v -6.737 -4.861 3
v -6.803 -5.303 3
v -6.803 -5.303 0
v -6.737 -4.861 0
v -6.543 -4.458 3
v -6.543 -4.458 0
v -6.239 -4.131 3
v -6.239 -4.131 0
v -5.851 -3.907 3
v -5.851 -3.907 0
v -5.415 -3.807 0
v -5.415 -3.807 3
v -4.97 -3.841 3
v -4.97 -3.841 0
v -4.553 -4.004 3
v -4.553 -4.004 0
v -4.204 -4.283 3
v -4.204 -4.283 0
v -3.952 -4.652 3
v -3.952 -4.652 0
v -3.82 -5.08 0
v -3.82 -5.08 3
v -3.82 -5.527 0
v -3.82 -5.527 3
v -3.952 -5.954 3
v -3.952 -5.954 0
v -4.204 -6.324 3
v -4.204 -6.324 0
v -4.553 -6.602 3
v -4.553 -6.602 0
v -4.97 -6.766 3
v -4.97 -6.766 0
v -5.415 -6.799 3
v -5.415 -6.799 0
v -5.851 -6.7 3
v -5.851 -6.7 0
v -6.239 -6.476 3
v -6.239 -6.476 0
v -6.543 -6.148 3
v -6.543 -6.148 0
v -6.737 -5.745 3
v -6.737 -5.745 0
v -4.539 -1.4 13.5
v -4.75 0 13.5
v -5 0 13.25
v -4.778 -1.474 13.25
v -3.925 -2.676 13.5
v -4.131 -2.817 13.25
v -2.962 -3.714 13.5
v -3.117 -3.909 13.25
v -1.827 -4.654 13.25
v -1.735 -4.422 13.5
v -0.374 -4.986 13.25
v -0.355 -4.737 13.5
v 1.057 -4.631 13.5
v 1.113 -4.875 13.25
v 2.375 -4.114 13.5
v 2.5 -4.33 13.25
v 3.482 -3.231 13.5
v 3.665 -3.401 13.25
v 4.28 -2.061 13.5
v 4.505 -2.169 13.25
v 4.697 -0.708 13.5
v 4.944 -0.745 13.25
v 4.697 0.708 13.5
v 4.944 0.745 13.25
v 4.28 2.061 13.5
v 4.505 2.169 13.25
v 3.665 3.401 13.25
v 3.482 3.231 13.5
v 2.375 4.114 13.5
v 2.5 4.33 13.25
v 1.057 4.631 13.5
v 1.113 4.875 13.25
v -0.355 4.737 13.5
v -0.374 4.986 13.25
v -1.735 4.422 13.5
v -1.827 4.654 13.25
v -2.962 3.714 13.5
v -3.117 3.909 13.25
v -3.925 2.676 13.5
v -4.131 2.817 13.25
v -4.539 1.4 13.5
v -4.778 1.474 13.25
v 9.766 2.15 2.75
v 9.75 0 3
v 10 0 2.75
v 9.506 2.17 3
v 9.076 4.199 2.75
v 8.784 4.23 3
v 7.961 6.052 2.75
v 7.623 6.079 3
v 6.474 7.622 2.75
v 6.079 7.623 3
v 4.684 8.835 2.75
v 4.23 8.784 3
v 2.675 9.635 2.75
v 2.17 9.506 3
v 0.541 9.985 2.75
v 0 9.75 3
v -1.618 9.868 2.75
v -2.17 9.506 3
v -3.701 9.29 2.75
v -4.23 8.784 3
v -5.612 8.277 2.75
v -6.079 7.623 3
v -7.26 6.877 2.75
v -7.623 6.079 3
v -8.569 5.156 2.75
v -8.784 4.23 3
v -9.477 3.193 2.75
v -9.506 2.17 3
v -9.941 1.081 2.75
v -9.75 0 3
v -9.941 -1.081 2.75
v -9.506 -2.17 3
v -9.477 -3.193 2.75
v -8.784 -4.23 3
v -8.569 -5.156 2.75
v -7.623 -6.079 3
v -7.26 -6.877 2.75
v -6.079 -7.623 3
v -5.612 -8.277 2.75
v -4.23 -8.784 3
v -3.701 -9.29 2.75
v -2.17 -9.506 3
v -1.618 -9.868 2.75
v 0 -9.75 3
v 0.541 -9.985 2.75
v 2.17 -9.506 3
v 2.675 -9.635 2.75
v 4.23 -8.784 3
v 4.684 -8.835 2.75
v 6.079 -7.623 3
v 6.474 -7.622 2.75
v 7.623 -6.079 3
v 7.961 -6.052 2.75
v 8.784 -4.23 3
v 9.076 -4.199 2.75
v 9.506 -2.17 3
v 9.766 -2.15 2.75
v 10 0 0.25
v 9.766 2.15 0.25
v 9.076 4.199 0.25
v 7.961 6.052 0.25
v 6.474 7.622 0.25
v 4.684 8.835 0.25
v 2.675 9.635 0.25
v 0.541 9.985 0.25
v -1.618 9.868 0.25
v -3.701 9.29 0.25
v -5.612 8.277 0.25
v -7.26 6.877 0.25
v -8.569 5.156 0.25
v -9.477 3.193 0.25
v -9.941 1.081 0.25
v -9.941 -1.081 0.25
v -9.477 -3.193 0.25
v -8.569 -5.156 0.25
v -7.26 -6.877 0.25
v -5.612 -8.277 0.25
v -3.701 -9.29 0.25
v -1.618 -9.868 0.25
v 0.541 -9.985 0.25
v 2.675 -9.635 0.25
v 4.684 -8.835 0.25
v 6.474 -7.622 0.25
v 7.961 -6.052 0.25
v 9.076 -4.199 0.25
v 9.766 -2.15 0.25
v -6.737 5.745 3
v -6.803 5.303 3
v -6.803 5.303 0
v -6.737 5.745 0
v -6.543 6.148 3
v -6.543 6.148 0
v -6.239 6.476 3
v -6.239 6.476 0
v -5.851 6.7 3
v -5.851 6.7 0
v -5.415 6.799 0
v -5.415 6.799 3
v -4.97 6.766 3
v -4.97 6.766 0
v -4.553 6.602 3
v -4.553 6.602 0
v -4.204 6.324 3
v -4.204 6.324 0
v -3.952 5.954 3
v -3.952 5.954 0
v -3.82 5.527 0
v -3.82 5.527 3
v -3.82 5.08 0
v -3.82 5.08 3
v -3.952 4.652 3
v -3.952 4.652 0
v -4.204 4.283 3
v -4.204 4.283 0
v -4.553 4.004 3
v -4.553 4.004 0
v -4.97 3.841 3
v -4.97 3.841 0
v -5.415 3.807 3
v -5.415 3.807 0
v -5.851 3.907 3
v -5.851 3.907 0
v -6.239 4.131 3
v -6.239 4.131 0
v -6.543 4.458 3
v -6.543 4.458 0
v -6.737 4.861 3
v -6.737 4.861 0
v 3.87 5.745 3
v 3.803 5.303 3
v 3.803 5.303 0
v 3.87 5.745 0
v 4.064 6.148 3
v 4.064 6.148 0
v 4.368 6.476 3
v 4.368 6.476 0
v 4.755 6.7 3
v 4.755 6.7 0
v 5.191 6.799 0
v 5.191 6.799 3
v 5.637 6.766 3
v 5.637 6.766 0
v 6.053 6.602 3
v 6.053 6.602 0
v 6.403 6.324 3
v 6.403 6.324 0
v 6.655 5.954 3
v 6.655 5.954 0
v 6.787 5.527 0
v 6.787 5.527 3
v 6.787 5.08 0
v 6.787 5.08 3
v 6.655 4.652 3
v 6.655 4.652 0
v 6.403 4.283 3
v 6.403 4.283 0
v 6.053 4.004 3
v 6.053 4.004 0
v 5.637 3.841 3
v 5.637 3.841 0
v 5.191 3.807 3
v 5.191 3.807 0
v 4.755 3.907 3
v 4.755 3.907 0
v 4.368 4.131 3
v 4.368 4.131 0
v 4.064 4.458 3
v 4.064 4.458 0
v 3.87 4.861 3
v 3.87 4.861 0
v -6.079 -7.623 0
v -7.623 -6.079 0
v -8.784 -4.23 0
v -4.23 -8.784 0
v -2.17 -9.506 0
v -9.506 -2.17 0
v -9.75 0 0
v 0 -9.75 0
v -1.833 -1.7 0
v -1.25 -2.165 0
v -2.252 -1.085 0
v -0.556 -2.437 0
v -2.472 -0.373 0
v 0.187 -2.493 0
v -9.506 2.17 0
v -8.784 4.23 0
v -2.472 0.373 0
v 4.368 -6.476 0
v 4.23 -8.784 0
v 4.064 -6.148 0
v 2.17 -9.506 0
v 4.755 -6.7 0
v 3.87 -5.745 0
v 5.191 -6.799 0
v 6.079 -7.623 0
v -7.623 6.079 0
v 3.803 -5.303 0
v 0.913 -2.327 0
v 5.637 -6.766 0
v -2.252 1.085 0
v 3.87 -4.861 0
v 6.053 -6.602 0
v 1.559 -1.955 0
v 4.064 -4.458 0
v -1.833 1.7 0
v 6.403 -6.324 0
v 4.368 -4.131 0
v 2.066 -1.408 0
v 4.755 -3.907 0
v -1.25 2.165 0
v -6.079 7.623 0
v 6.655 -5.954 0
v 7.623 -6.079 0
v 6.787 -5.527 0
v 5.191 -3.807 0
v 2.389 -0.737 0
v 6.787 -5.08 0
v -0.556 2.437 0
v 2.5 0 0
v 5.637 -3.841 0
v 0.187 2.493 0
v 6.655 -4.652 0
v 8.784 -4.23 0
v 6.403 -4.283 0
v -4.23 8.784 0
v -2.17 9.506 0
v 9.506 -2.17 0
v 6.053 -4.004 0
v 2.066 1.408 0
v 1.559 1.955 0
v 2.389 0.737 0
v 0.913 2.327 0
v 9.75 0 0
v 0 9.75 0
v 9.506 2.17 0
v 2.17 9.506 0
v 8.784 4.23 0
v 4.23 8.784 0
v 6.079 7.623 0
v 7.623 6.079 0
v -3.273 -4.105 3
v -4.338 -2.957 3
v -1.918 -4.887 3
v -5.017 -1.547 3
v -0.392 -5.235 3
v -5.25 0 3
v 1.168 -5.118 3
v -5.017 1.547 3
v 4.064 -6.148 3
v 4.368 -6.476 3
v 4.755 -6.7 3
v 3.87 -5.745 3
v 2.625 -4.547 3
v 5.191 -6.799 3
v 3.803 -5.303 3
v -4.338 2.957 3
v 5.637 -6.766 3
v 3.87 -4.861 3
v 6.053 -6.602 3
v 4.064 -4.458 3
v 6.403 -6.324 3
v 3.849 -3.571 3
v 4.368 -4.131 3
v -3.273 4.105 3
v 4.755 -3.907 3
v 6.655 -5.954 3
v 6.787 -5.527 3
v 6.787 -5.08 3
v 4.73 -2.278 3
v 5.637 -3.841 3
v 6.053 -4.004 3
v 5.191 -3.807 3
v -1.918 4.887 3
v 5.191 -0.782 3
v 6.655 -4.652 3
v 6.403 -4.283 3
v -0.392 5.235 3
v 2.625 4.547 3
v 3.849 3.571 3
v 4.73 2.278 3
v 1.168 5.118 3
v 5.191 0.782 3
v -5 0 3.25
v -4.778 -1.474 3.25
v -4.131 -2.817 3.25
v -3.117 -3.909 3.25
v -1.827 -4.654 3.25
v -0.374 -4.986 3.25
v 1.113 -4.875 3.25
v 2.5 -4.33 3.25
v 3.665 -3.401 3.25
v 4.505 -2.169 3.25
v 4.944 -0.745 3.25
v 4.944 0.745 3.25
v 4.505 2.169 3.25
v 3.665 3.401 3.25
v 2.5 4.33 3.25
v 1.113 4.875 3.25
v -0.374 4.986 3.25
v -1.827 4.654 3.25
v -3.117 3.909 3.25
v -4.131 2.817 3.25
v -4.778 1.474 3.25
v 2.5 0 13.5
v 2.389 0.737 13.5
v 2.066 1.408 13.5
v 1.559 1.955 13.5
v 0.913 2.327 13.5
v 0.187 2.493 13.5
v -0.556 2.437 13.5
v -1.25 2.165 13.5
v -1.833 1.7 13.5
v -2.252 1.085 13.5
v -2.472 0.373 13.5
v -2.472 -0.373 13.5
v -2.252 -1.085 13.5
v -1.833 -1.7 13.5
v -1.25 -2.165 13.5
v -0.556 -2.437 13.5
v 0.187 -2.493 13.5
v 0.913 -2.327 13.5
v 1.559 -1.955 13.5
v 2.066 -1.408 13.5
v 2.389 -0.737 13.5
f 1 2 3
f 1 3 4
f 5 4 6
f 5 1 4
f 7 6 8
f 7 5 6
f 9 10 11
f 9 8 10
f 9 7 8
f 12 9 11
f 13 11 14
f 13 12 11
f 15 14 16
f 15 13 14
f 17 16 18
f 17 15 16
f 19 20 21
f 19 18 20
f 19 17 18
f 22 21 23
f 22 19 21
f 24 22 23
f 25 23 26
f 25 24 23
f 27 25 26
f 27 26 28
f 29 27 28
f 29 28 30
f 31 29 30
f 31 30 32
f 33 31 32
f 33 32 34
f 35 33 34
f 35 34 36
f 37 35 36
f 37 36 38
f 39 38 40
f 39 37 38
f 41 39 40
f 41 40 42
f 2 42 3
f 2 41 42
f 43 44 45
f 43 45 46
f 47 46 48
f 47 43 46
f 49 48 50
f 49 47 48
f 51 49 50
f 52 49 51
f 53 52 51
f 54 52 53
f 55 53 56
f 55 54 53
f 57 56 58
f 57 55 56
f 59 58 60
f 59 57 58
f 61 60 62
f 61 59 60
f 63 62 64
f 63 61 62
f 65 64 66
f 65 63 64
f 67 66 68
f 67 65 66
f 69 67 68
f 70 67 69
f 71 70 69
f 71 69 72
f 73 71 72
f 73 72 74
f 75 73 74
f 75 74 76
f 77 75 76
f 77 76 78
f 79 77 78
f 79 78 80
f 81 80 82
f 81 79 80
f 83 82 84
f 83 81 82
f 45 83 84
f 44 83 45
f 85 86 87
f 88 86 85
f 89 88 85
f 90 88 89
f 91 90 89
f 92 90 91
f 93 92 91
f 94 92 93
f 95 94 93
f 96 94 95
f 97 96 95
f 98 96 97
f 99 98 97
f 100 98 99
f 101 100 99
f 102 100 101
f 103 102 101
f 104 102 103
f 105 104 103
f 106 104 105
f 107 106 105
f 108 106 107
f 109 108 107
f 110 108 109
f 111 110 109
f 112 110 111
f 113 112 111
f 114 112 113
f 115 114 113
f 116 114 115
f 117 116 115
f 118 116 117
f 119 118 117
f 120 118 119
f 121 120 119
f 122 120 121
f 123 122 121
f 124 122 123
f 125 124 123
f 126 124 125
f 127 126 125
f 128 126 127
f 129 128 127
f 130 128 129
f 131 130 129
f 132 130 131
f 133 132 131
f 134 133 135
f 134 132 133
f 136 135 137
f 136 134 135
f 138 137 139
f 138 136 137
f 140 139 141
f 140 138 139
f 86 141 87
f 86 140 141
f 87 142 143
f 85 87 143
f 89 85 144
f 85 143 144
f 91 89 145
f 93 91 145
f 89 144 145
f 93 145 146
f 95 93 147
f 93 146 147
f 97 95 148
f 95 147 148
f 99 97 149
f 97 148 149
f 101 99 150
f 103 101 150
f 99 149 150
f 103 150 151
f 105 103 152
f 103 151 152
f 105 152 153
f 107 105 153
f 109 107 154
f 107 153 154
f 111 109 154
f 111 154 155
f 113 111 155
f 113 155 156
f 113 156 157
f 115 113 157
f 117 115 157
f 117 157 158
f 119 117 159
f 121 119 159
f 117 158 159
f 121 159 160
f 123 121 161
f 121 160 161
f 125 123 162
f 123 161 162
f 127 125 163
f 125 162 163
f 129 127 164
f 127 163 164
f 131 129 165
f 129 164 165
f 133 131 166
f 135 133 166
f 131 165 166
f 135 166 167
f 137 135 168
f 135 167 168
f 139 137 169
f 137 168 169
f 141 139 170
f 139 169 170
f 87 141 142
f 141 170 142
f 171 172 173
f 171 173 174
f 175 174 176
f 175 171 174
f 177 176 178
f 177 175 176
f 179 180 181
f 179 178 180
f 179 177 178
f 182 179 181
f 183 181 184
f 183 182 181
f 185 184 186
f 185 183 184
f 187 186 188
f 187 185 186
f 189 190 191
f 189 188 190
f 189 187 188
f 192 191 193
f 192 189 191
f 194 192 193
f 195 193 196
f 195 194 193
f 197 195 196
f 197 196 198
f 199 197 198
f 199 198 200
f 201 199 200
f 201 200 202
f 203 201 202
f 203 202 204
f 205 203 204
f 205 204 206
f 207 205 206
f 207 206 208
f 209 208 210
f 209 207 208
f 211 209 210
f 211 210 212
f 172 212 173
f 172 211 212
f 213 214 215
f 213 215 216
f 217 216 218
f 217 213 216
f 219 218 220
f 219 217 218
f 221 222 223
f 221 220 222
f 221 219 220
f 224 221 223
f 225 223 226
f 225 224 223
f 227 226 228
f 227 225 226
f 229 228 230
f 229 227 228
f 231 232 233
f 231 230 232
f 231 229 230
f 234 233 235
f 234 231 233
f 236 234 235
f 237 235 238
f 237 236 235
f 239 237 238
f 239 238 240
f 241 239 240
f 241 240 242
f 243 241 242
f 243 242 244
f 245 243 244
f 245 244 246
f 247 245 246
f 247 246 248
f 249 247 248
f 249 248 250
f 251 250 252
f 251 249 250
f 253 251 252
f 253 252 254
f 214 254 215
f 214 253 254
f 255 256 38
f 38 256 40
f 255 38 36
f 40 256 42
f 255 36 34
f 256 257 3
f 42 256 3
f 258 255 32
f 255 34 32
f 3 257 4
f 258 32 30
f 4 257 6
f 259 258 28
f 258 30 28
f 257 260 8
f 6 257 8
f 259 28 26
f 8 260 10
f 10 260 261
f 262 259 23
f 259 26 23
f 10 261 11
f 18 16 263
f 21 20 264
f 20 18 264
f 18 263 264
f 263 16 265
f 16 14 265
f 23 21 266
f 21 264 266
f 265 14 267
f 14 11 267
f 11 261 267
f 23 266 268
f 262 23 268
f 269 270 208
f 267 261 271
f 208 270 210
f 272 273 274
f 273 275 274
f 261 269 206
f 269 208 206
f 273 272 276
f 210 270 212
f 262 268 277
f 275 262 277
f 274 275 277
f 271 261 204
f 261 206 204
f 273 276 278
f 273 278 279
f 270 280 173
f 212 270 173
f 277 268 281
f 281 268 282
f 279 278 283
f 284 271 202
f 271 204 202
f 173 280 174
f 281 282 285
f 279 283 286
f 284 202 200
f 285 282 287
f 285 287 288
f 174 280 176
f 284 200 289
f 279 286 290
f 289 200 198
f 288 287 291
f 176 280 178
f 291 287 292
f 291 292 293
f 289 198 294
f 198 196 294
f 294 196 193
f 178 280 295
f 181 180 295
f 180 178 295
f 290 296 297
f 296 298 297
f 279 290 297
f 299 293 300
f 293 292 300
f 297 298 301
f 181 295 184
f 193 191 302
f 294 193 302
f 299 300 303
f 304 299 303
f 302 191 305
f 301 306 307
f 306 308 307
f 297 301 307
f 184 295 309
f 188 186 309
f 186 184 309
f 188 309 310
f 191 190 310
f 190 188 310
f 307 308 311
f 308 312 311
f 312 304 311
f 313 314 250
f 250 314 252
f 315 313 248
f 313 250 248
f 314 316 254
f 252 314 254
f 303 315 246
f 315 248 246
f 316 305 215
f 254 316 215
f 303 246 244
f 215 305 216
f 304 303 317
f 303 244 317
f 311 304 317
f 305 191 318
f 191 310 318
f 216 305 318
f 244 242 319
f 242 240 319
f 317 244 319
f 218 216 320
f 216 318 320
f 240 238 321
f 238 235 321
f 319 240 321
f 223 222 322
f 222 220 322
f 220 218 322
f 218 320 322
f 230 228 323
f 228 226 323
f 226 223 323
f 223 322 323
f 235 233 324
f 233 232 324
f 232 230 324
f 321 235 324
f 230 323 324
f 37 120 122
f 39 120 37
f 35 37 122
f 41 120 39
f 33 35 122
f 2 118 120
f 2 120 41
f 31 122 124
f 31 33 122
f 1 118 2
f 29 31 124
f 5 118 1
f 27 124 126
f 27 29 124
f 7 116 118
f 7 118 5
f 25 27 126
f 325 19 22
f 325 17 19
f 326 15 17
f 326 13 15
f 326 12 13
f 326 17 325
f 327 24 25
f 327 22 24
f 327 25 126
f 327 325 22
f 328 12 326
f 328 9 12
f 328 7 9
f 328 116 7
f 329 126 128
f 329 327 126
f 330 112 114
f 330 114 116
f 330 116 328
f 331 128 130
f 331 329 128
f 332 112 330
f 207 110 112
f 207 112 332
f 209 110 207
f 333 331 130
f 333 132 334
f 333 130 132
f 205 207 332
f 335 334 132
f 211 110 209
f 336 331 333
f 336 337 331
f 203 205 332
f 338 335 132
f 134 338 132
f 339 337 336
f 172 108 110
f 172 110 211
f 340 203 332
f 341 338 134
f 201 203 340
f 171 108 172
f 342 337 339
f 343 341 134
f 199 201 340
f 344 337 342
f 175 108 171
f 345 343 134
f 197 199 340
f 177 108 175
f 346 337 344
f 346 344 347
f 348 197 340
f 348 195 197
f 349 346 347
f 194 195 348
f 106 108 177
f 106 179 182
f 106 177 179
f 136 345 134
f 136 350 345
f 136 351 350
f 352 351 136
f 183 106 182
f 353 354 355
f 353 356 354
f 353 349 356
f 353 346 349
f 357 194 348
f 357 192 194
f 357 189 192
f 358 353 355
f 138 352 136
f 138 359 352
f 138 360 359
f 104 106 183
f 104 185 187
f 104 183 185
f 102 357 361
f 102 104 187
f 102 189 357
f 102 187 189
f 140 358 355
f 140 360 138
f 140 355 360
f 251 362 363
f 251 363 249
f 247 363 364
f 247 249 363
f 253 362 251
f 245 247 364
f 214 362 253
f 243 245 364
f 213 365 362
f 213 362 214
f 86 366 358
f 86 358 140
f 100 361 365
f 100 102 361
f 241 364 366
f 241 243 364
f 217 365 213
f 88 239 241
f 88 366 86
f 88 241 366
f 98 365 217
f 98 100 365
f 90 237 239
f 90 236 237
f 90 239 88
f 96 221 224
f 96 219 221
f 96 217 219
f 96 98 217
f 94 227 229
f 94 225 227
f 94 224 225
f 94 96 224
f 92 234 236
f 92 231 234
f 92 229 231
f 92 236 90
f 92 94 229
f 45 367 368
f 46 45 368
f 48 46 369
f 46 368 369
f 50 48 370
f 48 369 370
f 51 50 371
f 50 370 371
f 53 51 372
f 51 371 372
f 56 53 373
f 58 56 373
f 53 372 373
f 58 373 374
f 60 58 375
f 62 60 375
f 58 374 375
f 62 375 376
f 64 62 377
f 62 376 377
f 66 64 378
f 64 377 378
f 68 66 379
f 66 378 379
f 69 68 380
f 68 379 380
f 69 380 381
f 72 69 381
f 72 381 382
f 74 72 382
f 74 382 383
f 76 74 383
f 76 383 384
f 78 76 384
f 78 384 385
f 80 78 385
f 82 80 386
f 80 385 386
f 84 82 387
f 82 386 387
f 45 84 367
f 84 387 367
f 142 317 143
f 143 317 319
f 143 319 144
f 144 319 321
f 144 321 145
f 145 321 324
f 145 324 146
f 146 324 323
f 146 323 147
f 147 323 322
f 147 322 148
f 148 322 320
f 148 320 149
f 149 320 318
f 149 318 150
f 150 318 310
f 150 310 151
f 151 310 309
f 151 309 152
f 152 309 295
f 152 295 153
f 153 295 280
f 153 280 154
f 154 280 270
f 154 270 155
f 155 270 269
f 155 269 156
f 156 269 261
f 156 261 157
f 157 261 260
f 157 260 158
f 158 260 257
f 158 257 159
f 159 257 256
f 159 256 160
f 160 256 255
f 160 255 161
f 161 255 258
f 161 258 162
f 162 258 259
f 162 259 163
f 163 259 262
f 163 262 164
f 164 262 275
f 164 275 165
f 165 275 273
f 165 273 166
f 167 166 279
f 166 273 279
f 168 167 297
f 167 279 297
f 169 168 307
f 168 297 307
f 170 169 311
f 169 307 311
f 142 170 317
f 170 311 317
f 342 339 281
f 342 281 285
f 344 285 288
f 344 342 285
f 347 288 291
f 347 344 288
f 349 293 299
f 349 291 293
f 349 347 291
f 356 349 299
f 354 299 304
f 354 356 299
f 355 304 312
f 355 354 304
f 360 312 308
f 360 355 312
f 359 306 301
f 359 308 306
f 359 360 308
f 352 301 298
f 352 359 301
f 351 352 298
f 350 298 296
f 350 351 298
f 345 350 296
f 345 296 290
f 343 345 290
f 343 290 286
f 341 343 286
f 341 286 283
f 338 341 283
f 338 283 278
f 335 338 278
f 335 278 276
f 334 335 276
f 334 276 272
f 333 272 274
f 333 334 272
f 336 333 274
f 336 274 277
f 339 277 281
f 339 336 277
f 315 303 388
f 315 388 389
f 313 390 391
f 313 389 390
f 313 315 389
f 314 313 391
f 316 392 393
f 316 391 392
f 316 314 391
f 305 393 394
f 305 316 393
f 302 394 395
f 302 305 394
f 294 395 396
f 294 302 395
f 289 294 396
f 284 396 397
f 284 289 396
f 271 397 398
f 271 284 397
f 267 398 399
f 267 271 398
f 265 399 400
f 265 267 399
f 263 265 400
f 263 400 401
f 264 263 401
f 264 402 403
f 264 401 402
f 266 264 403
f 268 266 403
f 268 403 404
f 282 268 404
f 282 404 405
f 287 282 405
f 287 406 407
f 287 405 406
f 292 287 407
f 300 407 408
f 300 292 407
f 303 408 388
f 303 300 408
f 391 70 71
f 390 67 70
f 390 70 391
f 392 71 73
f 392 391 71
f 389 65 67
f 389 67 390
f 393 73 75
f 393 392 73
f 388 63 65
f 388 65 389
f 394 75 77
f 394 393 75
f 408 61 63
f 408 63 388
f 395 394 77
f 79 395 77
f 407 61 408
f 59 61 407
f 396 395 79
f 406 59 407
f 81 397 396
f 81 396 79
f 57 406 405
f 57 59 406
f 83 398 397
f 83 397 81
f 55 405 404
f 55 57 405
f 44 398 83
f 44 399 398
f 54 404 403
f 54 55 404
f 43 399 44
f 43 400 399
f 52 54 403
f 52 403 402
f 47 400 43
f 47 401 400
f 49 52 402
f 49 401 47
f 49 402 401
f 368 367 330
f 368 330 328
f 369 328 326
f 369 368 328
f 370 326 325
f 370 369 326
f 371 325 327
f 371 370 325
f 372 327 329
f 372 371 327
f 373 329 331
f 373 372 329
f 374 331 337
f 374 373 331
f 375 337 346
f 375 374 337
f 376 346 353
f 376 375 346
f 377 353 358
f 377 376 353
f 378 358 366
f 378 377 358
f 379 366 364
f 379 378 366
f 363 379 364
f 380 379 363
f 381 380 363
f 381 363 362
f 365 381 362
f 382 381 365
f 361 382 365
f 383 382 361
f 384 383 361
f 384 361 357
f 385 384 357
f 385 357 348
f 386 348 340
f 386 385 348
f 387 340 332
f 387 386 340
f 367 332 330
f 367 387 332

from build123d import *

# Parameters (mm, degrees)
SKETCH1_R               = 10
BOSS_EXTRUDE1_DEPTH     = 3
SKETCH2_R               = 5
BOSS_EXTRUDE2_DEPTH     = 10.5
CUT_EXTRUDE1_DEPTH      = 20.551214796
CUT_EXTRUDE1_DEPTH_BACK = 20.551214796
SKETCH3_R               = 2.5
CHAMFER1_SIZE           = 0.25
CUT_EXTRUDE2_DEPTH      = 20.551214796
CUT_EXTRUDE2_DEPTH_BACK = 20.551214796
SKETCH4_R               = 1.5


with BuildPart() as part:
    # Sketch1 → Boss-Extrude1 (new body)
    with BuildSketch(Plane.XY):
        Circle(SKETCH1_R)
    extrude(amount=BOSS_EXTRUDE1_DEPTH)

    # Sketch2 → Boss-Extrude2 (add)
    with BuildSketch(Plane.XY.offset(3)):
        with Locations(Location((0, 0, 0), (0, 0, 180))):
            Circle(SKETCH2_R)
    extrude(amount=BOSS_EXTRUDE2_DEPTH)

    # Sketch3 → Cut-Extrude1 (cut, two sides: drawn at the far end of the back side and taken through both)
    with BuildSketch(Plane.XY.offset(13.5).offset(-CUT_EXTRUDE1_DEPTH_BACK)):
        Circle(SKETCH3_R)
    extrude(amount=CUT_EXTRUDE1_DEPTH + CUT_EXTRUDE1_DEPTH_BACK, mode=Mode.SUBTRACT)

    # Chamfer1
    chamfer1_edges = [part.edges().sort_by_distance(p)[0] for p in [
        (-10, 0, 0),
        (-10, 0, 3),
        (5, 0, 3),
        (5, 0, 13.5),
    ]]
    chamfer(chamfer1_edges, length=CHAMFER1_SIZE)

    # Sketch4 → Cut-Extrude2 (cut, two sides: drawn at the far end of the back side and taken through both)
    with BuildSketch(Plane(origin=(0, 0, 0), x_dir=(-1, 0, 0), z_dir=(0, 0, -1)).offset(-CUT_EXTRUDE2_DEPTH_BACK)):
        with Locations((-5.303300859, 5.303300859)):
            Circle(SKETCH4_R)
        with Locations((5.303300859, 5.303300859)):
            Circle(SKETCH4_R)
        with Locations((5.303300859, -5.303300859)):
            Circle(SKETCH4_R)
        with Locations((-5.303300859, -5.303300859)):
            Circle(SKETCH4_R)
    extrude(amount=CUT_EXTRUDE2_DEPTH + CUT_EXTRUDE2_DEPTH_BACK, mode=Mode.SUBTRACT)


solid = part.part
